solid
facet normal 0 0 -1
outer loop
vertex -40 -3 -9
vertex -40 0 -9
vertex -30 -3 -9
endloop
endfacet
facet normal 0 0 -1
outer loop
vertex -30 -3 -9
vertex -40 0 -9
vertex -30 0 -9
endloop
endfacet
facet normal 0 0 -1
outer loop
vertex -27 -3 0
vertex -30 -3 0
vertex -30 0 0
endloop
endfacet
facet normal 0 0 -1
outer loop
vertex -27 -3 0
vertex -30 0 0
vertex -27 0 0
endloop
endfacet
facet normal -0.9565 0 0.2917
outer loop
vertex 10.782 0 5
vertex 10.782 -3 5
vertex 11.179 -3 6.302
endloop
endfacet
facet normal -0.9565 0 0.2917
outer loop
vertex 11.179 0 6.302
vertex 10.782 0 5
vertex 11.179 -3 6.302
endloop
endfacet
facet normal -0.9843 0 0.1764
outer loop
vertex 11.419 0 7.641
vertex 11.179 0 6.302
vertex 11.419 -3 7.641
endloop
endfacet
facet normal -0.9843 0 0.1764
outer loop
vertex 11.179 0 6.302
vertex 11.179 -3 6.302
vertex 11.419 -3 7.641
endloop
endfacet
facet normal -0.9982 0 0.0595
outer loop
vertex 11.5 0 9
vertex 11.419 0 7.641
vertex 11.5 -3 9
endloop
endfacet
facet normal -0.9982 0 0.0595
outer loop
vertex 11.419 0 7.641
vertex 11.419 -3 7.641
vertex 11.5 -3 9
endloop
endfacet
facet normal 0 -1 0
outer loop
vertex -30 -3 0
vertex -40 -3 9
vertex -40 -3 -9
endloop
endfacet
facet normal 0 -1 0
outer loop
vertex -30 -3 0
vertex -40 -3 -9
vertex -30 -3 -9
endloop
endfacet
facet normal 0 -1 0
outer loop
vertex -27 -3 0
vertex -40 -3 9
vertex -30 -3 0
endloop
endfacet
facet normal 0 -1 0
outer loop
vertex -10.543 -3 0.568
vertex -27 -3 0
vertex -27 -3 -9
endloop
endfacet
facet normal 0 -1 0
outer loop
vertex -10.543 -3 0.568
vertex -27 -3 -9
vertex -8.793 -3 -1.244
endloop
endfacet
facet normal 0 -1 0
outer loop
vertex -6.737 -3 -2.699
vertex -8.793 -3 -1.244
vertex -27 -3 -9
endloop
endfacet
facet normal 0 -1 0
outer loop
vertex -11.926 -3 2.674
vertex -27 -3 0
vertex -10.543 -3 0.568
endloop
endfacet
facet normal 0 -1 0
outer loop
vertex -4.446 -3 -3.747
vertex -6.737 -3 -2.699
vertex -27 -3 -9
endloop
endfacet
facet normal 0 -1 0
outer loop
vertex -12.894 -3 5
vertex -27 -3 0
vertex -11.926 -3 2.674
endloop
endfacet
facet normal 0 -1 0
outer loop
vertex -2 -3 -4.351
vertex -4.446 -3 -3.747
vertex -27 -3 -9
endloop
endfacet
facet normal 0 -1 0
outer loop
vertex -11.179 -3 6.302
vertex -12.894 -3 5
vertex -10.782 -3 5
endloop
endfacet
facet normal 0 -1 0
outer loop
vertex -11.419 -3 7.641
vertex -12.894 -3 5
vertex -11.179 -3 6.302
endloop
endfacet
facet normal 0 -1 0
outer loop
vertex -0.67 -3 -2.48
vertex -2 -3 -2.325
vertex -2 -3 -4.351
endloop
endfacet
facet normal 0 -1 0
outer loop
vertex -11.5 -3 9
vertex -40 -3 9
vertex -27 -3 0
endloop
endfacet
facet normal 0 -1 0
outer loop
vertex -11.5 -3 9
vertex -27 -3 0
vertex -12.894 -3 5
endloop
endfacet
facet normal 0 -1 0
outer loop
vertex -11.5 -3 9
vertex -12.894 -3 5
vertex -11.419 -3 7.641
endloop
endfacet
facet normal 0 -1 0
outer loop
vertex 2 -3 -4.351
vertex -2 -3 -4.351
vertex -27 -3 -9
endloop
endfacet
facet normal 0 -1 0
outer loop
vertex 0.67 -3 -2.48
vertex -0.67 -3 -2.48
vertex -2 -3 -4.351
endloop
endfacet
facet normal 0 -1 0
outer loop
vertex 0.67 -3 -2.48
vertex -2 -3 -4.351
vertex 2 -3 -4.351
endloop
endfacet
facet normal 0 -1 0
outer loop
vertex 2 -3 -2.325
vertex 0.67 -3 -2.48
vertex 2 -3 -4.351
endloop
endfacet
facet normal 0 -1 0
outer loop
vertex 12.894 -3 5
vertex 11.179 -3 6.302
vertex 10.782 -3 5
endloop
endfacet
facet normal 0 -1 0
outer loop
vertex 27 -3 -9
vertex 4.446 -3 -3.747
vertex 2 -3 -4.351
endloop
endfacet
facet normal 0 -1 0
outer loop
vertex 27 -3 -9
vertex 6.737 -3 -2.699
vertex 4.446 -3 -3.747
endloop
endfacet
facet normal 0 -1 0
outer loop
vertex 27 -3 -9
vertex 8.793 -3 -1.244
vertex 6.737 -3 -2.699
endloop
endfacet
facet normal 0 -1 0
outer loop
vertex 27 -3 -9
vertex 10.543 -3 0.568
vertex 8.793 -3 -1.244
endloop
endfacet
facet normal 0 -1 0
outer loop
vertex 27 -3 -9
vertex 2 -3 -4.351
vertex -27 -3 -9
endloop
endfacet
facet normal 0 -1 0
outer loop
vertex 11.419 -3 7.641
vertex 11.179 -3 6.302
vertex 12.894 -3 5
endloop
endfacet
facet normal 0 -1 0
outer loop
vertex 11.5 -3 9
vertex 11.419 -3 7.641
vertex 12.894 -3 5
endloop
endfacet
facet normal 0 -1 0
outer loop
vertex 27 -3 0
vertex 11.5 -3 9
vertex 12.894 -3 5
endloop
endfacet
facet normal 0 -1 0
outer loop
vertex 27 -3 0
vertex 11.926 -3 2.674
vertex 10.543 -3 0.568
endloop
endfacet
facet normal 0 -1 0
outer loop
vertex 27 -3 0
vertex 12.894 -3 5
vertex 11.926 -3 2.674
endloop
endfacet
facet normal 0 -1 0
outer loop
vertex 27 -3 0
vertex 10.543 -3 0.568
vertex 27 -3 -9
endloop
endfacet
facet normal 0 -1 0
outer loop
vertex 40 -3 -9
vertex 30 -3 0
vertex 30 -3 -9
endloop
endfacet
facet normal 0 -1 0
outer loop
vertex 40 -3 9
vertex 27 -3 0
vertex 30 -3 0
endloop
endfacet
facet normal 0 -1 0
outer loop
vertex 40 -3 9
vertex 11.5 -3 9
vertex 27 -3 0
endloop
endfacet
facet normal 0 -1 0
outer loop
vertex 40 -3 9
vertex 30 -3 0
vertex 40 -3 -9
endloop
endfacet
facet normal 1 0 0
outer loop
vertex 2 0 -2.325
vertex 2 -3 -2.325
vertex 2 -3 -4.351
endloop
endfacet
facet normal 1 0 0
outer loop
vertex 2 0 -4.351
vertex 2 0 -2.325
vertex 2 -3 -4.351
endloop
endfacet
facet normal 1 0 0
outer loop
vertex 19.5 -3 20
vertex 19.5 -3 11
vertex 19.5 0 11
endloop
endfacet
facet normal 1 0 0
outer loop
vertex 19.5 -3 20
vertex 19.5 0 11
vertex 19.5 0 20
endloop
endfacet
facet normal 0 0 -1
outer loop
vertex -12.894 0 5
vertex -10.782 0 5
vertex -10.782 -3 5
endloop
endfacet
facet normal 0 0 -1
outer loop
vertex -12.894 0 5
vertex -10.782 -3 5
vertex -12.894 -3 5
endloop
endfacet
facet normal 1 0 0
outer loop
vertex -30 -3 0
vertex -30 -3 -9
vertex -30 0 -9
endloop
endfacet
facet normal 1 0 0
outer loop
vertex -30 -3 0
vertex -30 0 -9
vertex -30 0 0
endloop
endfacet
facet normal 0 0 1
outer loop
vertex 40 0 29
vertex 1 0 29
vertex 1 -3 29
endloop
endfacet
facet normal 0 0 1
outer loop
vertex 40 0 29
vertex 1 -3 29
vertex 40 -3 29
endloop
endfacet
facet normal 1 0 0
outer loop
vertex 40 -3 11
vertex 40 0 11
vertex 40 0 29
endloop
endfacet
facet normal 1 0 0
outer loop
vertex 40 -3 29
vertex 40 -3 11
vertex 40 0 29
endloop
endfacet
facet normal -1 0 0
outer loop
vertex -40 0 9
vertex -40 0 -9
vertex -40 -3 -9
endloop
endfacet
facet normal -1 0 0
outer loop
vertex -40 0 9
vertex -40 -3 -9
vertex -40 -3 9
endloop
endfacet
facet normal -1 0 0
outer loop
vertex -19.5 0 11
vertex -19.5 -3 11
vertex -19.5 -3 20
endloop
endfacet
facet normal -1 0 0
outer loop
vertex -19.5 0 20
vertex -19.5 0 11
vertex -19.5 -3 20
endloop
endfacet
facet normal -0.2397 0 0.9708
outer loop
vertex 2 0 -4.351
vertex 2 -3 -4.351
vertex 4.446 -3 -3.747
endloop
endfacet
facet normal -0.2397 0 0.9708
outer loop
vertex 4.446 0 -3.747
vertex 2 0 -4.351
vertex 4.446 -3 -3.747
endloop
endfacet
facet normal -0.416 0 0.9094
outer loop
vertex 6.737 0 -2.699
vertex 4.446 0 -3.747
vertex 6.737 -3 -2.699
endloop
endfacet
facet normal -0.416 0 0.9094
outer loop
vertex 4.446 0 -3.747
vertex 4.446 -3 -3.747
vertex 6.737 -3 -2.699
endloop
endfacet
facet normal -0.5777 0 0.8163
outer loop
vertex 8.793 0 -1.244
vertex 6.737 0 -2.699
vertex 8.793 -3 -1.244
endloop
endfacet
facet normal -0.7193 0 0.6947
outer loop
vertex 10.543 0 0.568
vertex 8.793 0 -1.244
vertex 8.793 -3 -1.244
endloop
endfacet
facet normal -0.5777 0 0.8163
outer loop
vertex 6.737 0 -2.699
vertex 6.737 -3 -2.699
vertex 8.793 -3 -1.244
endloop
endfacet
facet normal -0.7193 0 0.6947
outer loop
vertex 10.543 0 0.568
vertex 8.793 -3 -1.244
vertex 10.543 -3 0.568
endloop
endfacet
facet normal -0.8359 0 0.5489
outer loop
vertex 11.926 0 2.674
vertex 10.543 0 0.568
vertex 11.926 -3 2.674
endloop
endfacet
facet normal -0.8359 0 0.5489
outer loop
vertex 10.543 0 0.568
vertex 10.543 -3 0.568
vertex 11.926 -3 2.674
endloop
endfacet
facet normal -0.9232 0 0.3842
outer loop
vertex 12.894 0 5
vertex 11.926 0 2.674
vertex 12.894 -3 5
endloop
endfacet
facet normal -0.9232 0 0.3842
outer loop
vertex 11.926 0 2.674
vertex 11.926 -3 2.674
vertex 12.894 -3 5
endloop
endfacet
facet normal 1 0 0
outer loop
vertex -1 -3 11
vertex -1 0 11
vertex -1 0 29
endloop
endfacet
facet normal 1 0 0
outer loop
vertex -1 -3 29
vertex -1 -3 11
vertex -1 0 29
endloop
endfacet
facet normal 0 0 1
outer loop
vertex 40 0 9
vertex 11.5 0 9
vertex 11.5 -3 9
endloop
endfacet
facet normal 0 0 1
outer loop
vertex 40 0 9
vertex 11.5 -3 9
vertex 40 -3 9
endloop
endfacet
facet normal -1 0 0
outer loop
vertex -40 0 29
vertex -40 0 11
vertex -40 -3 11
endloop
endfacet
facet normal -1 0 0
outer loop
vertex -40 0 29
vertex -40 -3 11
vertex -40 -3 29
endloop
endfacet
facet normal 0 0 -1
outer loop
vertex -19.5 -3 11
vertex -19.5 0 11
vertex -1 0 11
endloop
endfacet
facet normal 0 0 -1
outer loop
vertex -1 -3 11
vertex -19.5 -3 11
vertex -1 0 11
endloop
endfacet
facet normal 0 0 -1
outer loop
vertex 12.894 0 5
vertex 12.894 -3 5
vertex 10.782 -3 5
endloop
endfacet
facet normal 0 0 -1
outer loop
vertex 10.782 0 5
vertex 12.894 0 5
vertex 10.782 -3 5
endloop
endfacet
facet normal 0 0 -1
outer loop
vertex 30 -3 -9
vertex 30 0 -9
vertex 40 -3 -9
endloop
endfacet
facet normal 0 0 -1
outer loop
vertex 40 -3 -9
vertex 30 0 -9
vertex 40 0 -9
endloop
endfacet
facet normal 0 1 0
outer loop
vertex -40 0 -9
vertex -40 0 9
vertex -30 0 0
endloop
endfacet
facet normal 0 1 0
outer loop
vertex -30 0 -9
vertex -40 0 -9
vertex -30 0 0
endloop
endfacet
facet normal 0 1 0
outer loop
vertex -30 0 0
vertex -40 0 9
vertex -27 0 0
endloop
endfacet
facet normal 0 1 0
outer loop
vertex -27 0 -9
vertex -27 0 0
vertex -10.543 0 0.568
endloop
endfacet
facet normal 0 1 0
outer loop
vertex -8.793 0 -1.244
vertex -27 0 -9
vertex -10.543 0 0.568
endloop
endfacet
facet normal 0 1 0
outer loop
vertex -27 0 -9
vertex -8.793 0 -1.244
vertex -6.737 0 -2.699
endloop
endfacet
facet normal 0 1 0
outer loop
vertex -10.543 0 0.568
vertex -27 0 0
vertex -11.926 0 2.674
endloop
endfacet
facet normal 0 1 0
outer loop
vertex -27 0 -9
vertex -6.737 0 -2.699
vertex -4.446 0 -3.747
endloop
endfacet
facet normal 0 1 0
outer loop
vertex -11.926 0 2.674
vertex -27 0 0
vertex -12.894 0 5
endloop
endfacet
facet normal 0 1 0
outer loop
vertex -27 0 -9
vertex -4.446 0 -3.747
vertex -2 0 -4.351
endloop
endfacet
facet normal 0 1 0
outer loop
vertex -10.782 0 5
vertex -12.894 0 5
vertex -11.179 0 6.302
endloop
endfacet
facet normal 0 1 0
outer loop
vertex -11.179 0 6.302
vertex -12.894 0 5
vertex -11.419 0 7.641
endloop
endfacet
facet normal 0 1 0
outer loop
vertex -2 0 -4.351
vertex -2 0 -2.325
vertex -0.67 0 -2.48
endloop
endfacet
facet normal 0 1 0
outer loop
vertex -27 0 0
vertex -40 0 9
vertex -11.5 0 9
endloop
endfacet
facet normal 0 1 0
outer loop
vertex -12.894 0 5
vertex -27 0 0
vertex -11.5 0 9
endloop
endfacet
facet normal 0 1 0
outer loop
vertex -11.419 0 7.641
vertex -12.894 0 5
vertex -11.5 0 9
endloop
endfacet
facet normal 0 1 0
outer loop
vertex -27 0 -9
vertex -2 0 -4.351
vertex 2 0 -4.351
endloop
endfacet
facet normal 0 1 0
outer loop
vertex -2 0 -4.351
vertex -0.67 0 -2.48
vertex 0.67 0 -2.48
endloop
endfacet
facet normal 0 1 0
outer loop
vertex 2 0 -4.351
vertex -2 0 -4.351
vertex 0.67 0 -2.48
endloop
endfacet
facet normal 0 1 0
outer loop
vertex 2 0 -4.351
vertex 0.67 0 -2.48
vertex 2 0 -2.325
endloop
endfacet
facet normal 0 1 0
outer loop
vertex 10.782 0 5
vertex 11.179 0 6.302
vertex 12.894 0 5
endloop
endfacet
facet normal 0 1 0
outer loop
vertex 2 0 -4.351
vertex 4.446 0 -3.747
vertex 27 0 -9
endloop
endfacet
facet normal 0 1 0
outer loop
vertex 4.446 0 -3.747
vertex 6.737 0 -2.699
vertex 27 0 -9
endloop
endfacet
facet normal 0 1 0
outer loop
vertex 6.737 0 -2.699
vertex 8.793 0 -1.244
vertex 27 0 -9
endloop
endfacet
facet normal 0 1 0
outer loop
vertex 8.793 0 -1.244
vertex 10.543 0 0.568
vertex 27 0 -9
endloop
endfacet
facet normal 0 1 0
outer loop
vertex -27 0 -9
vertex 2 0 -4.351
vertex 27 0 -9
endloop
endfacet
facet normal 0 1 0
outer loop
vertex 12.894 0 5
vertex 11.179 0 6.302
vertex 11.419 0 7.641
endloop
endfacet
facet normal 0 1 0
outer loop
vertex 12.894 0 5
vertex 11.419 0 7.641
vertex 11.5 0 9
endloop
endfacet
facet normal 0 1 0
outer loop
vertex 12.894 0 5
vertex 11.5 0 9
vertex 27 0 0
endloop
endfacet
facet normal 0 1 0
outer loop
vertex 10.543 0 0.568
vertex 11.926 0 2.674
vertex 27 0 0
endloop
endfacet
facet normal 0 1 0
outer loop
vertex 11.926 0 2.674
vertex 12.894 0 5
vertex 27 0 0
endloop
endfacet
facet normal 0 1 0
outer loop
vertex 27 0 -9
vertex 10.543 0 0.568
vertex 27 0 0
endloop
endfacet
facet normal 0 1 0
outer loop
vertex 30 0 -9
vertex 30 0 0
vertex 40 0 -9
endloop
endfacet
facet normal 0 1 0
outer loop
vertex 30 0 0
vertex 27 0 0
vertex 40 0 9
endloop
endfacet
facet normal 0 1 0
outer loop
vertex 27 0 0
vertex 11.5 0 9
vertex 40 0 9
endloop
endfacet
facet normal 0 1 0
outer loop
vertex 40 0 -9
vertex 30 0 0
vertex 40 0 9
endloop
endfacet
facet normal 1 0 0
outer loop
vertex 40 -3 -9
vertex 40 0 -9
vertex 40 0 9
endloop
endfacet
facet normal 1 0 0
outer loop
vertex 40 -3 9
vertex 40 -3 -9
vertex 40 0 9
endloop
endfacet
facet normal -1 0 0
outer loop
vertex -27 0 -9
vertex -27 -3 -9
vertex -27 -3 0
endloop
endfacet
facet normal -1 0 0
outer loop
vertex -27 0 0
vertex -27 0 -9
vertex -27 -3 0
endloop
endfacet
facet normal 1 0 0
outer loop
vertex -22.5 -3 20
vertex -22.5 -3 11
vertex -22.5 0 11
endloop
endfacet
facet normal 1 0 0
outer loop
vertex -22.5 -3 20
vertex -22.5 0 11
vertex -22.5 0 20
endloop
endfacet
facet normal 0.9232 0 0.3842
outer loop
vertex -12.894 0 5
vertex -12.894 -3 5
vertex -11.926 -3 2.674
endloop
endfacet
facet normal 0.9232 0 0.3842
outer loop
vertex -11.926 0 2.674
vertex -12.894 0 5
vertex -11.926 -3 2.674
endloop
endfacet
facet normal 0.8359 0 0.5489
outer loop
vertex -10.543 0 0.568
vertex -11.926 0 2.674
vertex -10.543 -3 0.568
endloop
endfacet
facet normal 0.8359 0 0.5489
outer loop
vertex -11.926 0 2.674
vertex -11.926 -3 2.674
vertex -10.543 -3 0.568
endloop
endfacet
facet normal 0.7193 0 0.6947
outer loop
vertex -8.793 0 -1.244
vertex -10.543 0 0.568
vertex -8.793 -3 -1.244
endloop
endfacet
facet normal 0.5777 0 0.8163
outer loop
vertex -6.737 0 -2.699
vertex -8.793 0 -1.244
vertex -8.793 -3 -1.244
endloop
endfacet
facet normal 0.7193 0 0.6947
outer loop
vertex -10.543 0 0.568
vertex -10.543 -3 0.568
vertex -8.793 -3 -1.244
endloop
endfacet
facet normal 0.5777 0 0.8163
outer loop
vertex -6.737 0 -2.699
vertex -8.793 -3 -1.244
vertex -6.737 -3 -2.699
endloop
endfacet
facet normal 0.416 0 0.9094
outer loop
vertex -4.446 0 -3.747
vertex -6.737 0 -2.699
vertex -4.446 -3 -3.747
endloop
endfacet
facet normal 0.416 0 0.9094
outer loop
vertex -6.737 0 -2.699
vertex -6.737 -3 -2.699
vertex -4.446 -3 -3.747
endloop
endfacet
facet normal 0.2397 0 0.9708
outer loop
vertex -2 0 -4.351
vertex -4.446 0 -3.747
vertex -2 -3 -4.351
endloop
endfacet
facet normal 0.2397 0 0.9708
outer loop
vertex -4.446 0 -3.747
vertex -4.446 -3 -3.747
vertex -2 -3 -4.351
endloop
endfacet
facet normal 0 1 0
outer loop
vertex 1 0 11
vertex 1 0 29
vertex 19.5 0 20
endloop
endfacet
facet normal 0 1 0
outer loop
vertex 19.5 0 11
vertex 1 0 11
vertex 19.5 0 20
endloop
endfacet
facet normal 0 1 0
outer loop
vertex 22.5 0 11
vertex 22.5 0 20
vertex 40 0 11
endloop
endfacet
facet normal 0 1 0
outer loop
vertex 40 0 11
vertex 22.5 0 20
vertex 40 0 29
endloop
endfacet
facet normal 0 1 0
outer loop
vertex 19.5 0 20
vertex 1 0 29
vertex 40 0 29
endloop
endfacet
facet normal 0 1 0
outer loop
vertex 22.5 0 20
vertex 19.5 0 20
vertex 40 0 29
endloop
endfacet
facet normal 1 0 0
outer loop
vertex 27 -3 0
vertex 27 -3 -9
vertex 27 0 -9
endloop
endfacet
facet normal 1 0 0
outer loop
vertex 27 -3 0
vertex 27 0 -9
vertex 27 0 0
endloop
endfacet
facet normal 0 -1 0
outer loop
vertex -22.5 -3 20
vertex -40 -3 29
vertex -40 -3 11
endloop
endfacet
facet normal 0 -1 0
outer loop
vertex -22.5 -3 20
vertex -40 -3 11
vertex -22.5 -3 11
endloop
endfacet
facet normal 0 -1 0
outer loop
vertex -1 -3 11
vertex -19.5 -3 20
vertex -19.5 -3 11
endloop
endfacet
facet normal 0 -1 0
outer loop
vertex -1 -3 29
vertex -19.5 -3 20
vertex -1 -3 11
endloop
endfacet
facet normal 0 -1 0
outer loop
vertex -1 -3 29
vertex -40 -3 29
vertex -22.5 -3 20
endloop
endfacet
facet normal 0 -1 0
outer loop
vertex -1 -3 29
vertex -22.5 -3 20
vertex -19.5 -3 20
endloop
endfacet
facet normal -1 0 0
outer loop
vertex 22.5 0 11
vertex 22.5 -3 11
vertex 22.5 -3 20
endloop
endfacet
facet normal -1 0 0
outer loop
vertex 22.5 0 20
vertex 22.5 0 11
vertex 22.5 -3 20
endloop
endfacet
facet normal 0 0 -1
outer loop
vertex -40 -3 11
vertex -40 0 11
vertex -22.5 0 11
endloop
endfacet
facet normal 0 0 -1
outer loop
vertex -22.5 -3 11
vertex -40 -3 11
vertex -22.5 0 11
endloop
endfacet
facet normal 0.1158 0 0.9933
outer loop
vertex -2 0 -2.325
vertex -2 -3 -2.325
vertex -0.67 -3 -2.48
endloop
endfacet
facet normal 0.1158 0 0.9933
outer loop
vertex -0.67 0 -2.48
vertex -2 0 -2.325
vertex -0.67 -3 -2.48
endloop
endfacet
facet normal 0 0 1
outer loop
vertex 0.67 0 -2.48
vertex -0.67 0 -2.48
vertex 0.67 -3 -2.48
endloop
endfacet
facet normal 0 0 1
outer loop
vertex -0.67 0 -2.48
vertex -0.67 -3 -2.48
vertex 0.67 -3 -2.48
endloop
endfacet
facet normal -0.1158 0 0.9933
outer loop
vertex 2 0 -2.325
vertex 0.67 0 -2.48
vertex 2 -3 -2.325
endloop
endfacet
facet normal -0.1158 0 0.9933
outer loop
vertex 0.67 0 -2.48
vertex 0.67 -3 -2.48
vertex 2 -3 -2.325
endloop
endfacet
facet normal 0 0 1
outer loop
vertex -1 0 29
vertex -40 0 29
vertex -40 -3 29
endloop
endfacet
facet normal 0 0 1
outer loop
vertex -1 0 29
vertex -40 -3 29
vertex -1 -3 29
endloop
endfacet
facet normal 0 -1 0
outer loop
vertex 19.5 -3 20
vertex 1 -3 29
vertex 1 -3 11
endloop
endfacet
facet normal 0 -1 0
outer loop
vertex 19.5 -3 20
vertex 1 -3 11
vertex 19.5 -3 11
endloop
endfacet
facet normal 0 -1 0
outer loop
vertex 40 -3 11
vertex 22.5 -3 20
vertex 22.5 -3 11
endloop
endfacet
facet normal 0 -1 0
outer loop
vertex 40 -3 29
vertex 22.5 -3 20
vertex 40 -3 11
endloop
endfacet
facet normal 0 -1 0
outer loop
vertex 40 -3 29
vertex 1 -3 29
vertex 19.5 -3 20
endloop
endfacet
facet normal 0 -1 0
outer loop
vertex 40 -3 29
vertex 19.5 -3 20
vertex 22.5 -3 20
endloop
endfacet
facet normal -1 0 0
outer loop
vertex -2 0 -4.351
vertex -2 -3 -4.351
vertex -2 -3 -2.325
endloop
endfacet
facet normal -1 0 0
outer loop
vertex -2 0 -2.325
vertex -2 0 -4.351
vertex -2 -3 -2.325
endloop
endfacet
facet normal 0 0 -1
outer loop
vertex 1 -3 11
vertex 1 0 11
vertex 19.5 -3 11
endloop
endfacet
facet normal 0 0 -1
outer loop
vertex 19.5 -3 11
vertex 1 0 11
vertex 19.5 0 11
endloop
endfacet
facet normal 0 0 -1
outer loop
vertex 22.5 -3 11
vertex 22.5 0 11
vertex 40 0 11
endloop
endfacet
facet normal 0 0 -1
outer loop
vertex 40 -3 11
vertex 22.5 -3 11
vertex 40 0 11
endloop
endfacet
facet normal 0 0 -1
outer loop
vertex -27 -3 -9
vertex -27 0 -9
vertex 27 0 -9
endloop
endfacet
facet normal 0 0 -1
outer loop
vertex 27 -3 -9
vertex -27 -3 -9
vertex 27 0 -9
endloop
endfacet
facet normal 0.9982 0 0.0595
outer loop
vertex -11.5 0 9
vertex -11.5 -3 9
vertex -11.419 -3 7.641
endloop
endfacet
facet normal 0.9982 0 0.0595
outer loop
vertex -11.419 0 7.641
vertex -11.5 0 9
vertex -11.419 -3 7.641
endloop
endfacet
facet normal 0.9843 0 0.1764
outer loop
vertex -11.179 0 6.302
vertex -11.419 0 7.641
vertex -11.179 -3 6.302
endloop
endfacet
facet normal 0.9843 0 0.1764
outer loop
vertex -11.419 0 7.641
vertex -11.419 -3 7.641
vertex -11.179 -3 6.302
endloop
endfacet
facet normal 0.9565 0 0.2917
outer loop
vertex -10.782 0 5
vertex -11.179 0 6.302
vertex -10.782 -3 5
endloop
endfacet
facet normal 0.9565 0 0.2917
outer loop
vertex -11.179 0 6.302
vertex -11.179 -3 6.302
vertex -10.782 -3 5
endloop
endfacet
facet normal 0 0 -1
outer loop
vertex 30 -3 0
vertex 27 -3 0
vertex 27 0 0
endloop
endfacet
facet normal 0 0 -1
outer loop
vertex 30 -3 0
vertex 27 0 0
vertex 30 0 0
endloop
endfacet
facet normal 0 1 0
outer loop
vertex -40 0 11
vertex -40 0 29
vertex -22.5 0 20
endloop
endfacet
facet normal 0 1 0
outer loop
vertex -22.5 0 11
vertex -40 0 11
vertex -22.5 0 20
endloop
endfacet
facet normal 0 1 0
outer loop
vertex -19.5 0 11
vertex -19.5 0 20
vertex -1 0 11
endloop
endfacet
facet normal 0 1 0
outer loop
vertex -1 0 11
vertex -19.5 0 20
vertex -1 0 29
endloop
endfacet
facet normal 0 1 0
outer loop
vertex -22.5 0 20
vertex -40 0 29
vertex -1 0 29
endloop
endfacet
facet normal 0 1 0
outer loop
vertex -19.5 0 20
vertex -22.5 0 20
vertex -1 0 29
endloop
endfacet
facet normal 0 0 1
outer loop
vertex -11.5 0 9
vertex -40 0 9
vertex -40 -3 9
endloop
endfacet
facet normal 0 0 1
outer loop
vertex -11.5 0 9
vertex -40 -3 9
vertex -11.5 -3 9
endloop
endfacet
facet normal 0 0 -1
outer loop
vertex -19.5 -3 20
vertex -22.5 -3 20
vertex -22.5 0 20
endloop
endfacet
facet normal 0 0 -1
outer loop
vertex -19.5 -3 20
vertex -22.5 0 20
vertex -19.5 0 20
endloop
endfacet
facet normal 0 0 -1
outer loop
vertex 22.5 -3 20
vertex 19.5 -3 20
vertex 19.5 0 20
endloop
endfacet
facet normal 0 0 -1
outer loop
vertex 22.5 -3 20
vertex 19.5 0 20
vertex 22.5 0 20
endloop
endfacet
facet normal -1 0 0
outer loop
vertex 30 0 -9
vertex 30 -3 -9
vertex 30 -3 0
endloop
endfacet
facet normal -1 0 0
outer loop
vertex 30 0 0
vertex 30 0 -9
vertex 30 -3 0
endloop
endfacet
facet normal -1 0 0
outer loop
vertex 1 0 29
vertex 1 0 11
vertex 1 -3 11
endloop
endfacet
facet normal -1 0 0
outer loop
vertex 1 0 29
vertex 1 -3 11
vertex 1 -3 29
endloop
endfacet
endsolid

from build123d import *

# Parameters (mm, degrees)
F0_W     = 80
F0_H     = 18
F1_DEPTH = 3
F2_W     = 3
F2_H     = 9
F3_DEPTH = 3
F4_W     = 39
F4_H     = 18
F5_DEPTH = 3
F6_W     = 3
F6_H     = 9
F7_DEPTH = 3
F8_W     = 3
F8_H     = 9
F9_DEPTH = 3


with BuildPart() as f1:
    # F0 (on Front) → F1 (new body)
    with BuildSketch(Plane.XZ):
        Rectangle(F0_W, F0_H)
    extrude(amount=F1_DEPTH)

    # F2 (on face) → F3 (cut, through all)
    with BuildSketch(Plane.XZ.offset(3)):
        with BuildLine():
            ThreePointArc((-2, -2.324752), (-7.365964, 0.16866), (-10.781929, 5))
            Line((-10.781929, 5), (-12.893797, 5))
            ThreePointArc((-12.893797, 5), (-8.792994, -1.243694), (-2, -4.35103))
            Line((-2, -4.35103), (-2, -2.324752))
        make_face()
        with BuildLine():
            ThreePointArc((10.781929, 5), (7.365964, 0.16866), (2, -2.324752))
            Line((2, -2.324752), (2, -4.35103))
            ThreePointArc((2, -4.35103), (8.792994, -1.243694), (12.893797, 5))
            Line((12.893797, 5), (10.781929, 5))
        make_face()
        with Locations((-28.5, -4.5)):
            Rectangle(F2_W, F2_H)
        with Locations((28.5, -4.5)):
            Rectangle(F2_W, F2_H)
        with BuildLine():
            ThreePointArc((-11.5, 9), (-11.319059, 6.968029), (-10.781929, 5))
            ThreePointArc((-10.781929, 5), (-7.365964, 0.16866), (-2, -2.324752))
            ThreePointArc((-2, -2.324752), (0, -2.5), (2, -2.324752))
            ThreePointArc((2, -2.324752), (7.365964, 0.16866), (10.781929, 5))
            ThreePointArc((10.781929, 5), (11.319059, 6.968029), (11.5, 9))
            Line((11.5, 9), (-11.5, 9))
        make_face()
    extrude(amount=-F3_DEPTH, mode=Mode.SUBTRACT)


with BuildPart() as f5:
    # F4 (on Front) → F5 (new body)
    with BuildSketch(Plane.XZ):
        with Locations((-20.5, 20)):
            Rectangle(F4_W, F4_H)
        with Locations((20.5, 20)):
            Rectangle(F4_W, F4_H)
    extrude(amount=F5_DEPTH)

    # F6 (on face) → F7 (cut, through all)
    with BuildSketch(Plane.XZ.offset(3)):
        with Locations((-21, 15.5)):
            Rectangle(F6_W, F6_H)
    extrude(amount=-F7_DEPTH, mode=Mode.SUBTRACT)

    # F8 (on face) → F9 (cut, through all)
    with BuildSketch(Plane.XZ.offset(3)):
        with Locations((21, 15.5)):
            Rectangle(F8_W, F8_H)
    extrude(amount=-F9_DEPTH, mode=Mode.SUBTRACT)


solid = Compound([f1.part, f5.part])
